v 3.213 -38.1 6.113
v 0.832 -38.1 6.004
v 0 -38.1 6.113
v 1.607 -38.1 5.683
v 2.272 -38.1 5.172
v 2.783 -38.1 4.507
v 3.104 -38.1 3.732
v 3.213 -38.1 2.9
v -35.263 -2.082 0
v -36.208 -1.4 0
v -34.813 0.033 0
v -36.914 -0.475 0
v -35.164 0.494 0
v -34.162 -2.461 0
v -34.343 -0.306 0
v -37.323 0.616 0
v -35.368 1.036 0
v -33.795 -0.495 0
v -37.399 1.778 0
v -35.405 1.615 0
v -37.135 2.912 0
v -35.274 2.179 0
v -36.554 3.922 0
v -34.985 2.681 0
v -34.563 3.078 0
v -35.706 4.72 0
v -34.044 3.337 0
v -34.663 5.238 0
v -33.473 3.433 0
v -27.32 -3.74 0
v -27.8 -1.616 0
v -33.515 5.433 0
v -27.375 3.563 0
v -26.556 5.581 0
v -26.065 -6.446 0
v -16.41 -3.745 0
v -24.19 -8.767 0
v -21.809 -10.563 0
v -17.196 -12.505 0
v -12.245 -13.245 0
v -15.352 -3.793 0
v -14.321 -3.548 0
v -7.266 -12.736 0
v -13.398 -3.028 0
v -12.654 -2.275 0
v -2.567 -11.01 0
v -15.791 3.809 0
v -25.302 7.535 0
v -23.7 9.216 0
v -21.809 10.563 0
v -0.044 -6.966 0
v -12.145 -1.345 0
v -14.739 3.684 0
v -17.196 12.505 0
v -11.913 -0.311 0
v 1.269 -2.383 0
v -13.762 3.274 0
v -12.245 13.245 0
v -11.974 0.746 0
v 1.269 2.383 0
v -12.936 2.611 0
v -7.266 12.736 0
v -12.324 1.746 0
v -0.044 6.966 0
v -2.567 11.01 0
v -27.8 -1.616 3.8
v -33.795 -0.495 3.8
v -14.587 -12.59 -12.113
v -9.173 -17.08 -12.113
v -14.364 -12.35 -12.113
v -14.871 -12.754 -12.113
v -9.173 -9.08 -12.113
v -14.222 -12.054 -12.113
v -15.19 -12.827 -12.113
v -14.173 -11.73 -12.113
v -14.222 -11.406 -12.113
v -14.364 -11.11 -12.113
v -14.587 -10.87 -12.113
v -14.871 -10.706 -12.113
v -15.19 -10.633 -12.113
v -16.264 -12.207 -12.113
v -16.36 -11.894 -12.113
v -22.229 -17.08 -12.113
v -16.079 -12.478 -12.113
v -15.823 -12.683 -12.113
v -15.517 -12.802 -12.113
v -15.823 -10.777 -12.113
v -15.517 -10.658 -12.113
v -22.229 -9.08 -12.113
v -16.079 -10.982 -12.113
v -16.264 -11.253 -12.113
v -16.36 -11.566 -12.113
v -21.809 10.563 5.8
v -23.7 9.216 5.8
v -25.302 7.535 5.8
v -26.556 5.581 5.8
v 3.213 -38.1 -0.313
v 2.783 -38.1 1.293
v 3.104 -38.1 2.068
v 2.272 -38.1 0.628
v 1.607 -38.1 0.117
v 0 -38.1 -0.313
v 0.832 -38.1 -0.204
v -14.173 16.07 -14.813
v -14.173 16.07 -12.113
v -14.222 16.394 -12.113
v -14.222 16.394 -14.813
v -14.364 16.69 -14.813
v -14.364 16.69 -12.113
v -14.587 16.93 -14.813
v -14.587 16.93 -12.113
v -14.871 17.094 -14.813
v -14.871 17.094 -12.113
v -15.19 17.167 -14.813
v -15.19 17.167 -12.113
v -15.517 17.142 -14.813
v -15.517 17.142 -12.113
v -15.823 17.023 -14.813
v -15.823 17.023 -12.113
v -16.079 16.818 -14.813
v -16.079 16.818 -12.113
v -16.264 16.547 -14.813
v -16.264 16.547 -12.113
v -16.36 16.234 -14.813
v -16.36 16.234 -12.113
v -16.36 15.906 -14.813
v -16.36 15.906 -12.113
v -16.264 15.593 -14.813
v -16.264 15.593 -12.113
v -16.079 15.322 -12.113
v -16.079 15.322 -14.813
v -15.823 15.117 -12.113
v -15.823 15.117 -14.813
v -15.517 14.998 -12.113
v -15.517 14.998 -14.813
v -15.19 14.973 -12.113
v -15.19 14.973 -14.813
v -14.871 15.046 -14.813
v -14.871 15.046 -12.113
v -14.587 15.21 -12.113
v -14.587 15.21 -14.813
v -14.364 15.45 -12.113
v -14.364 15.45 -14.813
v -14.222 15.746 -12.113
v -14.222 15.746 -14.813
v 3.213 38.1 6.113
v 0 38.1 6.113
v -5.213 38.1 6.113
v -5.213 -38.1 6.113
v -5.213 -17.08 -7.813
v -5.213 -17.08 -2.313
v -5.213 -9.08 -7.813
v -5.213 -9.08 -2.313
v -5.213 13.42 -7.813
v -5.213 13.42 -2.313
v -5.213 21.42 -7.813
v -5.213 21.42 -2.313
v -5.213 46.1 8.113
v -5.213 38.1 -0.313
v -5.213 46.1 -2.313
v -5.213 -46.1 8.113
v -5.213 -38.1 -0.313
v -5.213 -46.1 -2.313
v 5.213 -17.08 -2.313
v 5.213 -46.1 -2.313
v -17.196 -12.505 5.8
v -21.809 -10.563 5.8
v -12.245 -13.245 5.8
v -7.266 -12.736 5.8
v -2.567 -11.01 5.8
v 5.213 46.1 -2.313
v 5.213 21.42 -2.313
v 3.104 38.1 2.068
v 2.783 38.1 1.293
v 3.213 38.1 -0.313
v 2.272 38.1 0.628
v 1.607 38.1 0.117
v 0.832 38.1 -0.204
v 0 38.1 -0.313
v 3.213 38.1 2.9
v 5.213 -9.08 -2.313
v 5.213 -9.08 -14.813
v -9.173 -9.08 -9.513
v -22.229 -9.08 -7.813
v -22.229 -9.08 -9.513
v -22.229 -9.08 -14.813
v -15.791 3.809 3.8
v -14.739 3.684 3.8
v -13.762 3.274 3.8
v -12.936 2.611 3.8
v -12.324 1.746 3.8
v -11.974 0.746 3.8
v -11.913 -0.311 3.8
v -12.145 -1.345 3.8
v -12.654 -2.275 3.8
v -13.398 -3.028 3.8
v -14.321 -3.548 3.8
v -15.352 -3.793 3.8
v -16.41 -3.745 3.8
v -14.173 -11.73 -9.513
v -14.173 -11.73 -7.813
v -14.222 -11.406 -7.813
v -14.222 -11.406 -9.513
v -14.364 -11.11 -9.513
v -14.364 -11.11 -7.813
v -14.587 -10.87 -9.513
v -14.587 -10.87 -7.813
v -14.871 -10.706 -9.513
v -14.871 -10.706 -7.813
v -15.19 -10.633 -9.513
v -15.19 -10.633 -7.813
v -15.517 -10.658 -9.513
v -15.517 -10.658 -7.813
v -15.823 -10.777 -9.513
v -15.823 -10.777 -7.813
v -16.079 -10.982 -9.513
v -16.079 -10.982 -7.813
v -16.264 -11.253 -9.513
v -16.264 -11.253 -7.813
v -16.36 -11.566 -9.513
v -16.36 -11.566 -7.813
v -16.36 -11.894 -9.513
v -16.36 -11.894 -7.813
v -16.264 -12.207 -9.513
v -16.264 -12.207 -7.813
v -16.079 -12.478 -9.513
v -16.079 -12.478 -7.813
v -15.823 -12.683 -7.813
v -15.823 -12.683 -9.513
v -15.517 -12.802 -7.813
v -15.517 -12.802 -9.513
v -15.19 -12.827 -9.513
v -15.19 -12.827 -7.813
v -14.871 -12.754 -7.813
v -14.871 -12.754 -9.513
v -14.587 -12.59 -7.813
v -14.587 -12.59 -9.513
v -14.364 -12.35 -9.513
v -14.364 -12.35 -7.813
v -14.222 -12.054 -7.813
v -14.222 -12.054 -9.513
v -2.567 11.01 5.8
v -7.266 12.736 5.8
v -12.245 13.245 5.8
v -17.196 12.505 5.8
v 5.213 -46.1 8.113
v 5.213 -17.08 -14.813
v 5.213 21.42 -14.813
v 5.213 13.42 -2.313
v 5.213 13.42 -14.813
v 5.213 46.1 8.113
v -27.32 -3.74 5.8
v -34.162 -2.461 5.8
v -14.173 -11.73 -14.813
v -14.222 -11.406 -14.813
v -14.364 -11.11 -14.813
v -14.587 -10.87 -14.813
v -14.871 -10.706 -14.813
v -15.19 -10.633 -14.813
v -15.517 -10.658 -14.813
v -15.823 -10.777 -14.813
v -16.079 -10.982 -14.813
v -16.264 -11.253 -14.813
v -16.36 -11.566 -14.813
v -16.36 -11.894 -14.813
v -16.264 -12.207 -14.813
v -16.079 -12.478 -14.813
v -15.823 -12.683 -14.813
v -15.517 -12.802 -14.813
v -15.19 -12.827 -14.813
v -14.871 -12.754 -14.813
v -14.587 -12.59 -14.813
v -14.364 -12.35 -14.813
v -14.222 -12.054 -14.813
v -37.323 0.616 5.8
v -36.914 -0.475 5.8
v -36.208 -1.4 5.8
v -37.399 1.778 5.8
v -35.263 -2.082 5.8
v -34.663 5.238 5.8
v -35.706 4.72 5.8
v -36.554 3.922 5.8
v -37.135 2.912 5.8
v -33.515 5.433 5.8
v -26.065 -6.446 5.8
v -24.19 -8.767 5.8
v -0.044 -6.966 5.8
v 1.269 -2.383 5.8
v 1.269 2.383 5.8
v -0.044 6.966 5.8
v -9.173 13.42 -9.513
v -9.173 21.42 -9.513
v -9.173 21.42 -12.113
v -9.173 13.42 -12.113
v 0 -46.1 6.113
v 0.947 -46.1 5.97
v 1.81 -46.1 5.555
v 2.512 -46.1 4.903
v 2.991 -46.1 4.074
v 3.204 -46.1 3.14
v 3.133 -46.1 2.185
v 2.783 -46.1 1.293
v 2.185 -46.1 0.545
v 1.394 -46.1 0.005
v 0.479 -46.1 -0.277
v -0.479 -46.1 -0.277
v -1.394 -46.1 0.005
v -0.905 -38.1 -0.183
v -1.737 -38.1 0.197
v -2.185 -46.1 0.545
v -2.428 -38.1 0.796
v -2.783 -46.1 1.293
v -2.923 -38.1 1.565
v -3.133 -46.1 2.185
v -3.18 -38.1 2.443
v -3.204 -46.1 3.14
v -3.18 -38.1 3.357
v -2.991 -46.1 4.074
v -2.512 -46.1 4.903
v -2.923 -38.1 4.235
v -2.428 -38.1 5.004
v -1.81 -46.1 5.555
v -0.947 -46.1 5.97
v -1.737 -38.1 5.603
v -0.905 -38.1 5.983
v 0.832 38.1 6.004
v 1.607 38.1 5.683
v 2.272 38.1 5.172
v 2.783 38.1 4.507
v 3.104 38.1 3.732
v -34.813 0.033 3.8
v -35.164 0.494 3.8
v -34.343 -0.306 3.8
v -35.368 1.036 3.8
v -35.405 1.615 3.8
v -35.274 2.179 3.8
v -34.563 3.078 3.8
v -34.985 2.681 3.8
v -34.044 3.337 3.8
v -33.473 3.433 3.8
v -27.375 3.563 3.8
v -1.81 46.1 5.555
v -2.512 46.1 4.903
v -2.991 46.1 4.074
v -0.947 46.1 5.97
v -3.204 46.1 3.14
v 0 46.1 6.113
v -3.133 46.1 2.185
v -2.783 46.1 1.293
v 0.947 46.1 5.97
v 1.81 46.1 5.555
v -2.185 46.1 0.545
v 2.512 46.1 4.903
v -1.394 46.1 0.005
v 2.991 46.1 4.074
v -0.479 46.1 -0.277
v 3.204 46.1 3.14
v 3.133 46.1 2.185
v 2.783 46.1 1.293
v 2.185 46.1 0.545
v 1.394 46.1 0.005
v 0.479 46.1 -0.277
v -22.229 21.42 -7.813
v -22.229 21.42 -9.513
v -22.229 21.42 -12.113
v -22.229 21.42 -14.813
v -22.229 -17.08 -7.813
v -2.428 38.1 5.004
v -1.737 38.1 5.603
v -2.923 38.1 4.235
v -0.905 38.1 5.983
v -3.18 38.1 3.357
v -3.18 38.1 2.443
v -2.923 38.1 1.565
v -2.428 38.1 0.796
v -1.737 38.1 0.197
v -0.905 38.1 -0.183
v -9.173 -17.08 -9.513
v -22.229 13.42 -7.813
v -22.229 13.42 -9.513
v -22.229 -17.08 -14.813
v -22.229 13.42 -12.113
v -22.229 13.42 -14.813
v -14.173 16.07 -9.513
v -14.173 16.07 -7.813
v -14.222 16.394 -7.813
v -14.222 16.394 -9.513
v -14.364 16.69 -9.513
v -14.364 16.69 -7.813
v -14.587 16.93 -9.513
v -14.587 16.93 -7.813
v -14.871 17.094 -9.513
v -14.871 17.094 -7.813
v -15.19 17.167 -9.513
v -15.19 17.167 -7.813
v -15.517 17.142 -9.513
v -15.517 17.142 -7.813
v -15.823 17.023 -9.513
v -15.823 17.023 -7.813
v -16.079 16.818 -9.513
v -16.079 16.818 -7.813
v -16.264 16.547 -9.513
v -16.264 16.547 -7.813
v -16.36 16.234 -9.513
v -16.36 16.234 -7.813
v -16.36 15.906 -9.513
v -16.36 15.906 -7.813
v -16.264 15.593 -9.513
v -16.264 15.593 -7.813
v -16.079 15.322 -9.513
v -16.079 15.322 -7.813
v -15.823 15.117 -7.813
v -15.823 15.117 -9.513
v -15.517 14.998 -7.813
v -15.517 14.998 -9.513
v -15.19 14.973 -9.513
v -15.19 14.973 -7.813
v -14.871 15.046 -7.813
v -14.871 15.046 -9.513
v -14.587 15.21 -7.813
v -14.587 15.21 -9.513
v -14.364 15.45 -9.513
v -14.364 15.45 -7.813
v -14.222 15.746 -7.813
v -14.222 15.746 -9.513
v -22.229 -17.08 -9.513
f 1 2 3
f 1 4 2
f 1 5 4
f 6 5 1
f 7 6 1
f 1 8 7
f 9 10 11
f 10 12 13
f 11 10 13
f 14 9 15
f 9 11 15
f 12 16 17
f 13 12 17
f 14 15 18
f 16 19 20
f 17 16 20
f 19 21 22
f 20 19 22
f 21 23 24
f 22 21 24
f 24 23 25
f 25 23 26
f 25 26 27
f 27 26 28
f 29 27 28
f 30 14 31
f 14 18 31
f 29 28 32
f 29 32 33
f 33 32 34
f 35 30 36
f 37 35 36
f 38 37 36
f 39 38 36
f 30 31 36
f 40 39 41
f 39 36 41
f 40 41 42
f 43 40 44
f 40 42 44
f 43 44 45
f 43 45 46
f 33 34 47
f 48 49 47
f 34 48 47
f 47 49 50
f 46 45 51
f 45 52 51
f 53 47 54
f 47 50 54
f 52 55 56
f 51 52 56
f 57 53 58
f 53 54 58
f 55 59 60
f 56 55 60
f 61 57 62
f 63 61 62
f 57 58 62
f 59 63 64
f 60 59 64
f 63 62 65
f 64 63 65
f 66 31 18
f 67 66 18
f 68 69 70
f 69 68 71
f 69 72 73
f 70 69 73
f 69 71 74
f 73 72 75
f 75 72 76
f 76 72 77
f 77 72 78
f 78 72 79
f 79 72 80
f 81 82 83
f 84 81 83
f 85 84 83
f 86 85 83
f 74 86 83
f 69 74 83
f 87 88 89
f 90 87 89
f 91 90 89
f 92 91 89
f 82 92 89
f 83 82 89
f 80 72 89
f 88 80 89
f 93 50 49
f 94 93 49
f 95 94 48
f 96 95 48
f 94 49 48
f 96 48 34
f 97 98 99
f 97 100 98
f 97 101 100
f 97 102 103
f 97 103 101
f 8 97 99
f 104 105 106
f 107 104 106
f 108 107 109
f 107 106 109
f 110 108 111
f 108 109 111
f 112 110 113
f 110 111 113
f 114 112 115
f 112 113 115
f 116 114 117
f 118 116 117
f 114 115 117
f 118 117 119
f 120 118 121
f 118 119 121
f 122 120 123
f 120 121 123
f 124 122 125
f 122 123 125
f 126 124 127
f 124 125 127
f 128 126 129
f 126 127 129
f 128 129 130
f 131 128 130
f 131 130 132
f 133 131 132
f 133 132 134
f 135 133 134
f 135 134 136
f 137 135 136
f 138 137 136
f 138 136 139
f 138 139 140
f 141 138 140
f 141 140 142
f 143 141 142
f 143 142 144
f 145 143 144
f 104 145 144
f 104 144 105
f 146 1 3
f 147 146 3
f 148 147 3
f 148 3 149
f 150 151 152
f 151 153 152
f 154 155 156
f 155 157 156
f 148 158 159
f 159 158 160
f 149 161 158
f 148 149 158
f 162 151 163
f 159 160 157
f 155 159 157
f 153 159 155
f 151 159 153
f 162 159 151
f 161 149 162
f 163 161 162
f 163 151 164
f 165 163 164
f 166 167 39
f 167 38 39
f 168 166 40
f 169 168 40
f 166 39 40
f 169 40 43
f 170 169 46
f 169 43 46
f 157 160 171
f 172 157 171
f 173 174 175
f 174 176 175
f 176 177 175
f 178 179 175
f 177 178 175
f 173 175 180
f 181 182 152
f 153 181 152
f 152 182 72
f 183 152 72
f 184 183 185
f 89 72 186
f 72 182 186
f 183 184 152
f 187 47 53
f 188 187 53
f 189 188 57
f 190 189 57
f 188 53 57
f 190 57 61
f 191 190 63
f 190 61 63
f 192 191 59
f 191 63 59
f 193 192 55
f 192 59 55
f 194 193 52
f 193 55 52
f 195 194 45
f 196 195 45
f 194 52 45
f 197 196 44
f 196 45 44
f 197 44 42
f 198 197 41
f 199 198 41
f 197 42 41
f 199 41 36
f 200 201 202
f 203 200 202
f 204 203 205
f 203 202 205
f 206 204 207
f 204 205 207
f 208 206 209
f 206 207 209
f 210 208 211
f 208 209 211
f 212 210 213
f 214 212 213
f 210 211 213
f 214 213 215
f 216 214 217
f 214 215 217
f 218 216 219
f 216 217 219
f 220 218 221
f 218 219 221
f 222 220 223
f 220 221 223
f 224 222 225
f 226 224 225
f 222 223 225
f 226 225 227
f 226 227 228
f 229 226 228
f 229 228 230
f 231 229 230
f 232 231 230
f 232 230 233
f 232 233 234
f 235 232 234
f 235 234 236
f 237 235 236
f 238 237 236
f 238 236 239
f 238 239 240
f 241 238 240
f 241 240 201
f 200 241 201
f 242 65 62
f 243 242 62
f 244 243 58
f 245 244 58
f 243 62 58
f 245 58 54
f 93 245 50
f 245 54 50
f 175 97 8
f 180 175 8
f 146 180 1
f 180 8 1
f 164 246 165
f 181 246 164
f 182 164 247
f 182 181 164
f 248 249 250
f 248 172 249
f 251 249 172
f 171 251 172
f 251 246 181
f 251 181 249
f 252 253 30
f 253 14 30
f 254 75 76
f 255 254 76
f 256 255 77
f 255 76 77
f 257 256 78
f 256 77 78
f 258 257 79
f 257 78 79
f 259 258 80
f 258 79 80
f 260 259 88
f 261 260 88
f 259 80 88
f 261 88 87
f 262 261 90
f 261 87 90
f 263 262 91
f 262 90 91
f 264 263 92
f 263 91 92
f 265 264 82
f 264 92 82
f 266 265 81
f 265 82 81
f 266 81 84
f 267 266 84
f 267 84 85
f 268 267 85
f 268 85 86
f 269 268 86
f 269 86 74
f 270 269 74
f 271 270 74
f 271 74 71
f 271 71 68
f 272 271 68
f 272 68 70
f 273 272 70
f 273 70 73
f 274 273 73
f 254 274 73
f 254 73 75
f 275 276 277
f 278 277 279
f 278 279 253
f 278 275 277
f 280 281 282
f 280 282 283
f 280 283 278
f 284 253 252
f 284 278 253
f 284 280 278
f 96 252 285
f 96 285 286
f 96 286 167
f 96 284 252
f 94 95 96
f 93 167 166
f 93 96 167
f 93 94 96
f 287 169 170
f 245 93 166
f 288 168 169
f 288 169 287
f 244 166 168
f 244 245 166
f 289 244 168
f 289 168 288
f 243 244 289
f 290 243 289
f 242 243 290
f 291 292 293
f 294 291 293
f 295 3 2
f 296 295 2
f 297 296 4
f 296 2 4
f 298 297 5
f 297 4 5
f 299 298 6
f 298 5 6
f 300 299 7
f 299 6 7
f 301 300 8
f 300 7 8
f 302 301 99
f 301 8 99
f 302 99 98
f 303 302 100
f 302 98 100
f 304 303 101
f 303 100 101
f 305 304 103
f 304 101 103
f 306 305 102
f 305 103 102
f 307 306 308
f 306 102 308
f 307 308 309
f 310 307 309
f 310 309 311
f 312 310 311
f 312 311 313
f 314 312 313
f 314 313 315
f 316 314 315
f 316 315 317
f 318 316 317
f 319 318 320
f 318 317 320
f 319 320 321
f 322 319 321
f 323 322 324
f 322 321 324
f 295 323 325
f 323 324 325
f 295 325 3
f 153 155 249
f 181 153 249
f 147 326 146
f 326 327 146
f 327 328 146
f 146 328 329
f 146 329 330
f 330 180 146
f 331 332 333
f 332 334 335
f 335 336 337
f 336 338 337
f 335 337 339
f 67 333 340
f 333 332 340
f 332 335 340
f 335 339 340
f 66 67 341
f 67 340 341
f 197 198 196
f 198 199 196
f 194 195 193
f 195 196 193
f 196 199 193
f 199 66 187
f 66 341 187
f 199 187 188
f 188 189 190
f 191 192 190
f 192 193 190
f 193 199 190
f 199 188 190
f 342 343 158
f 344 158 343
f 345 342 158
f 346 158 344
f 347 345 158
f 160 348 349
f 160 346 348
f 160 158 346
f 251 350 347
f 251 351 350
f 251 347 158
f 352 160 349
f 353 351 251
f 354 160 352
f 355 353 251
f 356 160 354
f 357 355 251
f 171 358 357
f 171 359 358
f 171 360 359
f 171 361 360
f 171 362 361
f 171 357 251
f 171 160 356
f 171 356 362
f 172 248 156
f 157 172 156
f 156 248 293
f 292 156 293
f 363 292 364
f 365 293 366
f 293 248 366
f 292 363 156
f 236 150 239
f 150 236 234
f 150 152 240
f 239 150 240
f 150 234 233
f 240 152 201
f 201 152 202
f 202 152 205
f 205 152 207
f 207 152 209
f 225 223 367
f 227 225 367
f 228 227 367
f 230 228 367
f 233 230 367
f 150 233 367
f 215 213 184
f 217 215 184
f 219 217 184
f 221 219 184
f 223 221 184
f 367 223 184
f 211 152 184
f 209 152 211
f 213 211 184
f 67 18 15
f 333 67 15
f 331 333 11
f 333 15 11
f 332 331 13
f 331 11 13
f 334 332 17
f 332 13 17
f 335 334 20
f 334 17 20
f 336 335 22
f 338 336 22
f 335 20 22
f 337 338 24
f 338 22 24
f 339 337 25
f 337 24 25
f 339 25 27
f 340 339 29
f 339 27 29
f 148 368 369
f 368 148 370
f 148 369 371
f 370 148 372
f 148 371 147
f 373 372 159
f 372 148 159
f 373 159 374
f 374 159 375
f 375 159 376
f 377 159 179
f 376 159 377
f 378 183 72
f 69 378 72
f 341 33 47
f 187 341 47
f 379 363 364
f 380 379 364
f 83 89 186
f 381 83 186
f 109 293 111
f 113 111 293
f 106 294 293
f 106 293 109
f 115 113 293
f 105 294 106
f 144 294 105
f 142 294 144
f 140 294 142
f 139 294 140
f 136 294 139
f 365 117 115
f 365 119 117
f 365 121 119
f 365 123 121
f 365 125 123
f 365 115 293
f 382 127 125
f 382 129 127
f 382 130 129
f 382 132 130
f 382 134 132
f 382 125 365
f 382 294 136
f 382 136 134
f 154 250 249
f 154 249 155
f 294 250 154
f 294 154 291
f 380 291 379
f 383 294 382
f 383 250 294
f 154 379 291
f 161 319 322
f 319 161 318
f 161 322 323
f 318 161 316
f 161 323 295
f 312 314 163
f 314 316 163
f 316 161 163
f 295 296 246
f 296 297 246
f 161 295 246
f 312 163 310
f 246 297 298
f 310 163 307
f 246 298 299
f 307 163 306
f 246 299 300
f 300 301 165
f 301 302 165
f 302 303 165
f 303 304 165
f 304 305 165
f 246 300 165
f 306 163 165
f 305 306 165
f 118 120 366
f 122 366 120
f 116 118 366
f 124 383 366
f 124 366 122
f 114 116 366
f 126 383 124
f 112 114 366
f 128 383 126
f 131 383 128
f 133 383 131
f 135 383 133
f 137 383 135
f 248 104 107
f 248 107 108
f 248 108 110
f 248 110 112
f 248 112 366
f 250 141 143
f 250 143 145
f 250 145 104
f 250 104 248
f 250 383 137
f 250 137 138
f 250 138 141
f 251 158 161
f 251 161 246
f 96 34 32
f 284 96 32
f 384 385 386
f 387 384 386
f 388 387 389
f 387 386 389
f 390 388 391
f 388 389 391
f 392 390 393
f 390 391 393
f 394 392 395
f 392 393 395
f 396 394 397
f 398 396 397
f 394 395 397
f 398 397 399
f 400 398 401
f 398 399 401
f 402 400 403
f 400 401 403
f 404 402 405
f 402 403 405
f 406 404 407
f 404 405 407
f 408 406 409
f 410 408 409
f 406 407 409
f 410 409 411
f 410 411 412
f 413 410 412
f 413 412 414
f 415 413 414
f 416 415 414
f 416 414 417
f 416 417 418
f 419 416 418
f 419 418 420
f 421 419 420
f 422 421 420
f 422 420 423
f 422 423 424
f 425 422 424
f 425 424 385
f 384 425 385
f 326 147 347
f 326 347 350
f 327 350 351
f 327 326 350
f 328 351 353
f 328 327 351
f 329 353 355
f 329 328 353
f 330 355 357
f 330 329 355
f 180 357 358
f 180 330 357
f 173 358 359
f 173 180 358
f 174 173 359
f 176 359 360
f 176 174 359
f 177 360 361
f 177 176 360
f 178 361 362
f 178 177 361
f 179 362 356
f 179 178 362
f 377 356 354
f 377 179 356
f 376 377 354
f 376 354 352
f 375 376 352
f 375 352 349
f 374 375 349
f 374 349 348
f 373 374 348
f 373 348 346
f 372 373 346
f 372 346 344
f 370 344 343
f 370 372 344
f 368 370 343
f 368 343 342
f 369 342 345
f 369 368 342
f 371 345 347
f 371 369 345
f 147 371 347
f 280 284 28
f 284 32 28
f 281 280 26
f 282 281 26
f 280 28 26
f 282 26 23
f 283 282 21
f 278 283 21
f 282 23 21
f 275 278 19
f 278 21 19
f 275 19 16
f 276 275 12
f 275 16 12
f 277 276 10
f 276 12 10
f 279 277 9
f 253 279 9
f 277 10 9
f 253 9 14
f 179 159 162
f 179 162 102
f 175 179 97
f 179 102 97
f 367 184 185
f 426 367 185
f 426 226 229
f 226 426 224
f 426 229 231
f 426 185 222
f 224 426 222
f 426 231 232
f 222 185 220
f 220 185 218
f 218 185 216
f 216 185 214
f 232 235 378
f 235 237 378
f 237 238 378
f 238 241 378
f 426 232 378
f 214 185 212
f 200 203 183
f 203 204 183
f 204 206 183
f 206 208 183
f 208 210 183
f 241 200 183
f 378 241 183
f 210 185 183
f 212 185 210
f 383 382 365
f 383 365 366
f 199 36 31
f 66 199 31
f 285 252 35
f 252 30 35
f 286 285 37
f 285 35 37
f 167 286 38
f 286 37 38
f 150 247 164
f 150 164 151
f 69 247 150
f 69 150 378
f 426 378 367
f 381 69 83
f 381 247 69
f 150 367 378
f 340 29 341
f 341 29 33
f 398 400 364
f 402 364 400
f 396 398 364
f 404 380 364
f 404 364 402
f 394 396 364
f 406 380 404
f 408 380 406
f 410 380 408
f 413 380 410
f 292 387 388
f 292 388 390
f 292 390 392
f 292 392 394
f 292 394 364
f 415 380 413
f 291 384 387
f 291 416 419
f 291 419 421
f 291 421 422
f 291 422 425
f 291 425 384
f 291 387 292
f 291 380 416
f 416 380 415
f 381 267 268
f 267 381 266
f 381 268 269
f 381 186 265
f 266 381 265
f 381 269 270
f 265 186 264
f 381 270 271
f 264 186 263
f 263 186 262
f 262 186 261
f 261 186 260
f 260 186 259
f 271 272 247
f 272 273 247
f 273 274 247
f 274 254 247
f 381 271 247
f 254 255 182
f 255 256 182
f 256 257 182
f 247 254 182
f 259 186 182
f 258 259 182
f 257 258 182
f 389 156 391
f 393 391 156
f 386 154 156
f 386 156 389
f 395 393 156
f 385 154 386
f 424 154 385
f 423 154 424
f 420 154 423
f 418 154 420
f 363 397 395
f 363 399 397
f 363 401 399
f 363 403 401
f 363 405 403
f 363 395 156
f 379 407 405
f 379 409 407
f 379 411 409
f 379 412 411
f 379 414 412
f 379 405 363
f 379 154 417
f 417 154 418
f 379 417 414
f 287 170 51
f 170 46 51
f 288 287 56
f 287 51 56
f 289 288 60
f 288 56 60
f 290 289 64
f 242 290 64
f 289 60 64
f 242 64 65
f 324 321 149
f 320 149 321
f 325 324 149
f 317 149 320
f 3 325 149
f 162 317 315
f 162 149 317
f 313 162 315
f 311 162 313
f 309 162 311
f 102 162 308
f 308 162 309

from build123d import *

# Parameters (mm, degrees)
BOSS_EXTRUDE1_DEPTH      = 3.800000096
BOSS_EXTRUDE2_DEPTH      = 2
BOSS_EXTRUDE3_DEPTH      = 38.1
BOSS_EXTRUDE3_DEPTH_BACK = 38.1
BOSS_EXTRUDE4_START      = 38.1
SKETCH11_W               = 10.4262
SKETCH11_H               = 10.4262
SKETCH11_R               = 3.2131
BOSS_EXTRUDE4_DEPTH      = 8
BOSS_EXTRUDE5_START      = -38.1
SKETCH11_2_W             = 10.4262
SKETCH11_2_H             = 10.4262
SKETCH11_2_R             = 3.2131
BOSS_EXTRUDE5_DEPTH      = 8
BOSS_EXTRUDE6_DEPTH      = 8
BOSS_EXTRUDE7_DEPTH      = 8
SKETCH15_R               = 1.1
CUT_EXTRUDE1_DEPTH       = 8


with BuildPart() as part:
    # Sketch7 → Boss-Extrude1 (new body)
    with BuildSketch(Plane.XY):
        with BuildLine():
            ThreePointArc((-33.515331309, 5.433002286), (-37.398650401, 1.777981375), (-34.162442321, -2.460686138))
            Line((-34.162442321, -2.460686138), (-27.319744353, -3.740057236))
            ThreePointArc((-27.319744353, -3.740057236), (-25.198740105, -7.664015147), (-21.808759445, -10.563003905))
            ThreePointArc((-21.808759445, -10.563003905), (-12.24514023, -13.245034669), (-2.567249995, -11.010187448))
            ThreePointArc((-2.567249995, -11.010187448), (1.4351, 0), (-2.567249995, 11.010187448))
            ThreePointArc((-2.567249995, 11.010187448), (-12.24514023, 13.245034669), (-21.808759445, 10.563003905))
            ThreePointArc((-21.808759445, 10.563003905), (-24.540834155, 8.413644492), (-26.555630229, 5.58087643))
            Line((-26.555630229, 5.58087643), (-33.515331309, 5.433002286))
        make_face()
        with BuildLine():
            Line((-27.37529807, 3.563009393), (-15.791139853, 3.809140291))
            ThreePointArc((-15.791139853, 3.809140291), (-11.912944563, -0.311292991), (-16.410423725, -3.745102876))
            Line((-16.410423725, -3.745102876), (-27.799834704, -1.615638256))
            Line((-27.799834704, -1.615638256), (-33.794874116, -0.49475287))
            ThreePointArc((-33.794874116, -0.49475287), (-35.405337155, 1.614572981), (-33.472846503, 3.433453577))
            Line((-33.472846503, 3.433453577), (-27.37529807, 3.563009393))
        make_face(mode=Mode.SUBTRACT)
    extrude(amount=BOSS_EXTRUDE1_DEPTH)

    # Sketch8 → Boss-Extrude2 (add)
    with BuildSketch(Plane.XY.offset(3.800000096)):
        with BuildLine():
            Line((-26.555630229, 5.58087643), (-33.515331309, 5.433002286))
            ThreePointArc((-33.515331309, 5.433002286), (-37.398650401, 1.777981375), (-34.162442321, -2.460686138))
            Line((-34.162442321, -2.460686138), (-27.319744353, -3.740057236))
            ThreePointArc((-27.319744353, -3.740057236), (-25.198740105, -7.664015147), (-21.808759445, -10.563003905))
            ThreePointArc((-21.808759445, -10.563003905), (-12.24514023, -13.245034669), (-2.567249995, -11.010187448))
            ThreePointArc((-2.567249995, -11.010187448), (1.4351, 0), (-2.567249995, 11.010187448))
            ThreePointArc((-2.567249995, 11.010187448), (-12.24514023, 13.245034669), (-21.808759445, 10.563003905))
            ThreePointArc((-21.808759445, 10.563003905), (-24.540834155, 8.413644492), (-26.555630229, 5.58087643))
        make_face()
    extrude(amount=BOSS_EXTRUDE2_DEPTH)


with BuildPart() as body_2:
    # Sketch10 → Boss-Extrude3 (new, two sides: drawn at the far end of the back side and taken through both)
    with BuildSketch(Plane(origin=(0, 0, 0), x_dir=(1, 0, 0), z_dir=(0, 1, 0)).offset(-BOSS_EXTRUDE3_DEPTH_BACK)):
        Polygon((-5.2131, -6.113100048), (-5.2131, -8.113100048), (5.2131, -8.113100048), (5.2131, 2.313099952), (-5.2131, 2.313099952), (-5.2131, 0.313099952), (0, 0.313099952), (3.2131, 0.313099952), (3.2131, -2.900000048), (3.2131, -6.113100048), (0, -6.113100048), align=None)
    extrude(amount=BOSS_EXTRUDE3_DEPTH + BOSS_EXTRUDE3_DEPTH_BACK)

    # Sketch11 → Boss-Extrude4 (add)
    with BuildSketch(Plane(origin=(0, 0, 0), x_dir=(1, 0, 0), z_dir=(0, 1, 0)).offset(BOSS_EXTRUDE4_START)):
        with Locations((0, -2.900000048)):
            Rectangle(SKETCH11_W, SKETCH11_H)
        with Locations(Location((0, -2.900000048, 0), (0, 0, 270))):
            Circle(SKETCH11_R, mode=Mode.SUBTRACT)
    extrude(amount=BOSS_EXTRUDE4_DEPTH)

    # Sketch11<2> → Boss-Extrude5 (add)
    with BuildSketch(Plane(origin=(0, 0, 0), x_dir=(1, 0, 0), z_dir=(0, 1, 0)).offset(BOSS_EXTRUDE5_START)):
        with Locations((0, -2.900000048)):
            Rectangle(SKETCH11_2_W, SKETCH11_2_H)
        with Locations(Location((0, -2.900000048, 0), (0, 0, 270))):
            Circle(SKETCH11_2_R, mode=Mode.SUBTRACT)
    extrude(amount=-BOSS_EXTRUDE5_DEPTH)

    # Sketch13 → Boss-Extrude6 (add)
    with BuildSketch(Plane(origin=(0, -9.08, 0), x_dir=(1, 0, 0), z_dir=(0, 1, 0))):
        Polygon((-22.228682365, 9.513099952), (-9.172698806, 9.513099952), (-9.172698806, 12.113099952), (-22.228682365, 12.113099952), (-22.228682365, 14.813099952), (5.2131, 14.813099952), (5.2131, 7.813099952), (5.2131, 2.313099952), (-5.2131, 2.313099952), (-5.2131, 7.813099952), (-22.228682365, 7.813099952), align=None)
    extrude(amount=-BOSS_EXTRUDE6_DEPTH)

    # Sketch14 → Boss-Extrude7 (add)
    with BuildSketch(Plane(origin=(0, 13.42, 0), x_dir=(1, 0, 0), z_dir=(0, 1, 0))):
        Polygon((-22.228682365, 9.513099952), (-9.172698806, 9.513099952), (-9.172698806, 12.113099952), (-22.228682365, 12.113099952), (-22.228682365, 14.813099952), (5.2131, 14.813099952), (5.2131, 7.813099952), (5.2131, 2.313099952), (-5.2131, 2.313099952), (-5.2131, 7.813099952), (-22.228682365, 7.813099952), align=None)
    extrude(amount=BOSS_EXTRUDE7_DEPTH)

    # Sketch15 → Cut-Extrude1 (cut)
    with BuildSketch(Plane.XY.offset(-7.813099952)):
        with Locations((-15.272698806, 16.07)):
            Circle(SKETCH15_R)
        with Locations((-15.272698806, -11.73)):
            Circle(SKETCH15_R)
    extrude(amount=-CUT_EXTRUDE1_DEPTH, mode=Mode.SUBTRACT)


solid = Compound([part.part, body_2.part])
